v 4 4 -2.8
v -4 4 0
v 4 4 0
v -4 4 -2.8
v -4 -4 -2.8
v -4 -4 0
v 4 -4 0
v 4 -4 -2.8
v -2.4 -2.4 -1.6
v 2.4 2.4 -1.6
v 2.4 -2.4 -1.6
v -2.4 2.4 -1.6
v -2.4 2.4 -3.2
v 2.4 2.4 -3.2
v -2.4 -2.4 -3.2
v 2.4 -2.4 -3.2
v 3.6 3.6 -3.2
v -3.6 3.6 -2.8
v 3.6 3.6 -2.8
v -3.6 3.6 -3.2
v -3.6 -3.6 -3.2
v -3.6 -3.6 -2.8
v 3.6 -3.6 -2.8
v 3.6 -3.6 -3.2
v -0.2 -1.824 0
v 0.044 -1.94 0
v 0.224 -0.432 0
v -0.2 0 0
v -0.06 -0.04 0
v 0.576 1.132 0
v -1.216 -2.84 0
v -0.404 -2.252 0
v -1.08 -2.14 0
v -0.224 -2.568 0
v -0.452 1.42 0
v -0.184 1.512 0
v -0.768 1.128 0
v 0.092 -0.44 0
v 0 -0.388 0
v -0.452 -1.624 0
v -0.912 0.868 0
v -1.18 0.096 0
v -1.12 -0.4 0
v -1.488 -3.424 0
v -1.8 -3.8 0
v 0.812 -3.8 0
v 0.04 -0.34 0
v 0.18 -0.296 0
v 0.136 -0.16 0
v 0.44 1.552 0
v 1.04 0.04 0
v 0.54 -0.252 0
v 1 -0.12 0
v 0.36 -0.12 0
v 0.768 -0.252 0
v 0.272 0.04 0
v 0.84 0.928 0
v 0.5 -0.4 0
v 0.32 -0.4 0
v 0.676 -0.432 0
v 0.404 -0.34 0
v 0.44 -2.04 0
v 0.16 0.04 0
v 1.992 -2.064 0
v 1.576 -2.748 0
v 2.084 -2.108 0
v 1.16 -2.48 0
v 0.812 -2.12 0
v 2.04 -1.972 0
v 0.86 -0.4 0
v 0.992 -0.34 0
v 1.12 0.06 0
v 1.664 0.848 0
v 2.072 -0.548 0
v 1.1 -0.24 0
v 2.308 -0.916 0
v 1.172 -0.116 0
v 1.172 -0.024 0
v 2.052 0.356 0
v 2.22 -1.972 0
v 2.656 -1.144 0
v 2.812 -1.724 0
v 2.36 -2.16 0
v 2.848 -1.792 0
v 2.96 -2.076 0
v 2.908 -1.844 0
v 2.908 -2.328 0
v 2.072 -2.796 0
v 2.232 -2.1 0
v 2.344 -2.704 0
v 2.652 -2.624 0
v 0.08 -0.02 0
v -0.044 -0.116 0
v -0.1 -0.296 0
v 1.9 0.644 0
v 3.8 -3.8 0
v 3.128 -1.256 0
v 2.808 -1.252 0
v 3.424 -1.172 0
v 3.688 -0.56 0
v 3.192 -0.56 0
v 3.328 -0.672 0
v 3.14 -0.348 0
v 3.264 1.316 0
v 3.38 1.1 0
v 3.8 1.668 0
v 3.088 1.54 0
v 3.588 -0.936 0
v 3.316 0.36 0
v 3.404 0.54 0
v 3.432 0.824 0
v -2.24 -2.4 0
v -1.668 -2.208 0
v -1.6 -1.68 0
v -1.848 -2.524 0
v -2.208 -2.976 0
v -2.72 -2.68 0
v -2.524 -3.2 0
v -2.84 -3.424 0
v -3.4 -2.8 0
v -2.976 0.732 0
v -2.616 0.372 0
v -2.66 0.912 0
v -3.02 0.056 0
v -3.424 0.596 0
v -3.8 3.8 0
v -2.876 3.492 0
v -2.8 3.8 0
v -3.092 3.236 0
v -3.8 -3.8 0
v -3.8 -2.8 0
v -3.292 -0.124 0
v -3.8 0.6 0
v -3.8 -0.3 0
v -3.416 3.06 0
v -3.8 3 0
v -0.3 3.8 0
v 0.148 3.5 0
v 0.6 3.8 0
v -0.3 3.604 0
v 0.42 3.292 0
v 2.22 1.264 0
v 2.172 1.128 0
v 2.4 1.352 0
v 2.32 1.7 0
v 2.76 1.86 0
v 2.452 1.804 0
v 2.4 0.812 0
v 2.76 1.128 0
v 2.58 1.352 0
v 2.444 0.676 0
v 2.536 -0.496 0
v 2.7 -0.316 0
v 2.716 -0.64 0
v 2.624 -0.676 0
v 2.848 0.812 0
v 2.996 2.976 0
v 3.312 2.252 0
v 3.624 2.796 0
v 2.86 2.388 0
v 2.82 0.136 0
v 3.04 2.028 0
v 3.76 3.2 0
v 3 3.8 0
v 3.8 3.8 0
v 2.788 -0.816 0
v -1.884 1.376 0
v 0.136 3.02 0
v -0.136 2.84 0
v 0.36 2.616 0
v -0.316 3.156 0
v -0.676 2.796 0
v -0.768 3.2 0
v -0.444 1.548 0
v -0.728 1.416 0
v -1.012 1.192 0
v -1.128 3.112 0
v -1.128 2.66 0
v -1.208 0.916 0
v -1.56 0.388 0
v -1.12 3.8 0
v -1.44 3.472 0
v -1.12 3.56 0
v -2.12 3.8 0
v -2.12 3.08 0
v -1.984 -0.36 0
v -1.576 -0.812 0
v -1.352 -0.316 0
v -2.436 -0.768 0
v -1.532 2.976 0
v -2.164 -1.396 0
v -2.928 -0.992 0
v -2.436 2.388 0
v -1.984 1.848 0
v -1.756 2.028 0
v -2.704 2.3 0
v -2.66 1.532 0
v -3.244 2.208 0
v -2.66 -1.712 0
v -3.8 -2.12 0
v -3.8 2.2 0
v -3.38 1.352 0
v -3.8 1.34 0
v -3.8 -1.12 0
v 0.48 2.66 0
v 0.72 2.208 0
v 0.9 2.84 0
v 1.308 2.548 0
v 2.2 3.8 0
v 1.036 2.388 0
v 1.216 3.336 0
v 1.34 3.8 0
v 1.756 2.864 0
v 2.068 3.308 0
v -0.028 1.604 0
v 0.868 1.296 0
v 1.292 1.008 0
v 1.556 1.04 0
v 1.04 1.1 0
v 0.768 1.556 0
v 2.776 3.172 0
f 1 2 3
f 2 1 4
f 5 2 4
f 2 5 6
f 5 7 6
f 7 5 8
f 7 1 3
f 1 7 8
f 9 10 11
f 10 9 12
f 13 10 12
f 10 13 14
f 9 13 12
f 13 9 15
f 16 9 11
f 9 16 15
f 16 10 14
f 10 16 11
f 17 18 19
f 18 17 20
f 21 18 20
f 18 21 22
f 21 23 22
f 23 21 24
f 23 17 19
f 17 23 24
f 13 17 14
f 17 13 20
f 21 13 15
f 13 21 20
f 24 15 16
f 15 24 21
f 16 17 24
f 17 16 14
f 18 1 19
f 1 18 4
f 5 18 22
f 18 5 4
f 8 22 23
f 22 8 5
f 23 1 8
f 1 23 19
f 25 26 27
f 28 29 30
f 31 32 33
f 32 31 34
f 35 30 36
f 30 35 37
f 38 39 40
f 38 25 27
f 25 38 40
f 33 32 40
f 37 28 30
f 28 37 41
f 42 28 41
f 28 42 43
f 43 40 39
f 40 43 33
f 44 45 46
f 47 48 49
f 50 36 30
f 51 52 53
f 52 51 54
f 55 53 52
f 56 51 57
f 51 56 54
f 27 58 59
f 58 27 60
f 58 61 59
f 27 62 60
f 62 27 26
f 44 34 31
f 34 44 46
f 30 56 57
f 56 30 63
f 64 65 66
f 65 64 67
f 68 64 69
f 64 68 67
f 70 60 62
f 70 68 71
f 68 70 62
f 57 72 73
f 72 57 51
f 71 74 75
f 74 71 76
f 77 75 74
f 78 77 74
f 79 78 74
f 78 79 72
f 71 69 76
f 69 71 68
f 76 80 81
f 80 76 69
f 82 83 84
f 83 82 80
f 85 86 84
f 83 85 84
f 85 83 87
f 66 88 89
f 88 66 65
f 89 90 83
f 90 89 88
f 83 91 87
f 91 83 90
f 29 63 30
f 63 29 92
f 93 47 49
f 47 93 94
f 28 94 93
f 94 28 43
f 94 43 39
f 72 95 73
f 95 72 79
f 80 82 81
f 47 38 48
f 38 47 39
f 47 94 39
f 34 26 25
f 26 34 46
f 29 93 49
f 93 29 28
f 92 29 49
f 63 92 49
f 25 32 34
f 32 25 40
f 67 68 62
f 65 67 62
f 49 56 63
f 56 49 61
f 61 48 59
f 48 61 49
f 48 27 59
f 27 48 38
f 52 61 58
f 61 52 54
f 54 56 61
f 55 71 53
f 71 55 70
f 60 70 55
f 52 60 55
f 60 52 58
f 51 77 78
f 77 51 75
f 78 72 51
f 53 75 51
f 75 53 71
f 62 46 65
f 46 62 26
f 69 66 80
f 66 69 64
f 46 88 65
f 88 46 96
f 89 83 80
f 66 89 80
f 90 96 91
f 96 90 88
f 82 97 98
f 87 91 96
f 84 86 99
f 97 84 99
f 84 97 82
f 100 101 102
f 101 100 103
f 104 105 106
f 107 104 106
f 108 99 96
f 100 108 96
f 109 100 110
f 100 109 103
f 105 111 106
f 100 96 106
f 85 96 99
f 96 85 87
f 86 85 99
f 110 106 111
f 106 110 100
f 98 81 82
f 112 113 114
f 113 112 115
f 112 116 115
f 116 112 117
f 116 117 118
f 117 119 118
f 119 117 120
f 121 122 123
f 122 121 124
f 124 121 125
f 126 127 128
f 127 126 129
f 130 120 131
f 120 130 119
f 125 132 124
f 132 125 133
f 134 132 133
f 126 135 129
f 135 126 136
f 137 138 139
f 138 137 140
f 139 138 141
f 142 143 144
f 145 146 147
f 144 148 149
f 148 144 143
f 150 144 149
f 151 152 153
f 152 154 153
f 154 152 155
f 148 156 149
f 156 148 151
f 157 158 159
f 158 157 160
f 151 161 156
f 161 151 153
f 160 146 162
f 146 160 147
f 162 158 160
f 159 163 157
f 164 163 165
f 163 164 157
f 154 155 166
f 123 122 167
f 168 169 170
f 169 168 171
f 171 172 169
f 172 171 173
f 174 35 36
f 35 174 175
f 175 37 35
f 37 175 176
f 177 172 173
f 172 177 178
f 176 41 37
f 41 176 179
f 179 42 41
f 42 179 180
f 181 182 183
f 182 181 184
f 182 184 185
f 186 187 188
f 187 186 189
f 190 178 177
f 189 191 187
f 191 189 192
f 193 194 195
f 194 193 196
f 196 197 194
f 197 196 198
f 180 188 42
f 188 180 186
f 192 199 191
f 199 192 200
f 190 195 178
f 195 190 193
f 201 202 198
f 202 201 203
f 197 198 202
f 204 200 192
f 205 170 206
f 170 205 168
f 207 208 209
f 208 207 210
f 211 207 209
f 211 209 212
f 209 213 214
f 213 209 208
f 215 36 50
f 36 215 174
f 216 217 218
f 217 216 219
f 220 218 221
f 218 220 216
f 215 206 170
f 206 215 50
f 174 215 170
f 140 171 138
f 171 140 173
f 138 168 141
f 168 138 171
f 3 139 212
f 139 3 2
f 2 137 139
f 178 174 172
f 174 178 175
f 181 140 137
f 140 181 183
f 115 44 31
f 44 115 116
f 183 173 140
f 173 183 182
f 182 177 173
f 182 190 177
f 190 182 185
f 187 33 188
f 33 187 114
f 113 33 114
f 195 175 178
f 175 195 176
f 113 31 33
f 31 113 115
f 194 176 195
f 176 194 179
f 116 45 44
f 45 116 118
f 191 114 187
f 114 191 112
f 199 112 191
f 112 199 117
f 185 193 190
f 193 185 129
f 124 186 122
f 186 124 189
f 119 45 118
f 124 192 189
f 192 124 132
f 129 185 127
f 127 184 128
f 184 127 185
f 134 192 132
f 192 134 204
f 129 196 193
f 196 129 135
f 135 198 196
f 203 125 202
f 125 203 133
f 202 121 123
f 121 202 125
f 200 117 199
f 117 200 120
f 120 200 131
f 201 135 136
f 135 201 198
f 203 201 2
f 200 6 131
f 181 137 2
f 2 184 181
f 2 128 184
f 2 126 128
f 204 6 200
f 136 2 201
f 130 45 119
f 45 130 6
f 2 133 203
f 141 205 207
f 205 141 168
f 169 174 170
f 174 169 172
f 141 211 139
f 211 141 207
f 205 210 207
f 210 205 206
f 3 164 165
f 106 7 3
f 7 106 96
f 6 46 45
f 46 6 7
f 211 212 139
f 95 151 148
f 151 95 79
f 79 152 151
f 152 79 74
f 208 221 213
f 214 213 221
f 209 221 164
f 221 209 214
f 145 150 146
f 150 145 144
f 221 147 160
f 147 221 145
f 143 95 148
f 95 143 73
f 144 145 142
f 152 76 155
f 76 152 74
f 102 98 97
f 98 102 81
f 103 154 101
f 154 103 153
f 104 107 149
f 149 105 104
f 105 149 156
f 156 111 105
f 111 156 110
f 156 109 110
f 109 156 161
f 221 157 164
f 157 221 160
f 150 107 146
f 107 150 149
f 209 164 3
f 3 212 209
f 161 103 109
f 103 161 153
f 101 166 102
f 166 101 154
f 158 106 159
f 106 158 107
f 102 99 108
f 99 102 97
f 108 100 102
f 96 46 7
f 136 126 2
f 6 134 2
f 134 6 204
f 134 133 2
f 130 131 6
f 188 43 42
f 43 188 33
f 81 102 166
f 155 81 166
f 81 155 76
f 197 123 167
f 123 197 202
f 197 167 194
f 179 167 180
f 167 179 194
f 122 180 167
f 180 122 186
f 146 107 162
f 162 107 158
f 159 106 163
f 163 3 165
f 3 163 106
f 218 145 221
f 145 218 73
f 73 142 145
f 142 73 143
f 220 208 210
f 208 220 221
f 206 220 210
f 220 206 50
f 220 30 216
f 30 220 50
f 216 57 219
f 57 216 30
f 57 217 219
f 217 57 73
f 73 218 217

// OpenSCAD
// file: ../p/box5.scad
use <../lib.scad>
function ldraw_lib__box5() = [
// 0 Box with 5 Faces and All Edges
// 0 Name: box5.dat
// 0 Author: James Jessiman
// 0 !LDRAW_ORG Primitive UPDATE 2012-01
// 0 !LICENSE Licensed under CC BY 2.0 and CC BY 4.0 : see CAreadme.txt
// 
// 0 BFC CERTIFY CCW
  [0,"BFC","CERTIFY"],
  [0,"BFC","CCW"],
// 
// 0 !HISTORY 2002-04-03 [sbliss] Modified for BFC compliance
// 0 !HISTORY 2002-04-25 [PTadmin] Official Update 2002-02
// 0 !HISTORY 2007-06-24 [PTadmin] Header formatted for Contributor Agreement
// 0 !HISTORY 2008-07-01 [PTadmin] Official Update 2008-01
// 0 !HISTORY 2012-02-16 [Philo] Changed to CCW
// 0 !HISTORY 2012-03-30 [PTadmin] Official Update 2012-01
// 
// 
// 2 24 1 1 1 -1 1 1
  [2,24,1,1,1,-1,1,1],
// 2 24 -1 1 1 -1 1 -1
  [2,24,-1,1,1,-1,1,-1],
// 2 24 -1 1 -1 1 1 -1
  [2,24,-1,1,-1,1,1,-1],
// 2 24 1 1 -1 1 1 1
  [2,24,1,1,-1,1,1,1],
// 2 24 1 0 1 -1 0 1
  [2,24,1,0,1,-1,0,1],
// 2 24 -1 0 1 -1 0 -1
  [2,24,-1,0,1,-1,0,-1],
// 2 24 -1 0 -1 1 0 -1
  [2,24,-1,0,-1,1,0,-1],
// 2 24 1 0 -1 1 0 1
  [2,24,1,0,-1,1,0,1],
// 2 24 1 0 1 1 1 1
  [2,24,1,0,1,1,1,1],
// 2 24 -1 0 1 -1 1 1
  [2,24,-1,0,1,-1,1,1],
// 2 24 1 0 -1 1 1 -1
  [2,24,1,0,-1,1,1,-1],
// 2 24 -1 0 -1 -1 1 -1
  [2,24,-1,0,-1,-1,1,-1],
// 4 16 -1 1 1 1 1 1 1 1 -1 -1 1 -1
  [4,16,-1,1,1,1,1,1,1,1,-1,-1,1,-1],
// 4 16 -1 1 1 -1 0 1 1 0 1 1 1 1
  [4,16,-1,1,1,-1,0,1,1,0,1,1,1,1],
// 4 16 -1 1 -1 -1 0 -1 -1 0 1 -1 1 1
  [4,16,-1,1,-1,-1,0,-1,-1,0,1,-1,1,1],
// 4 16 1 1 -1 1 0 -1 -1 0 -1 -1 1 -1
  [4,16,1,1,-1,1,0,-1,-1,0,-1,-1,1,-1],
// 4 16 1 1 1 1 0 1 1 0 -1 1 1 -1
  [4,16,1,1,1,1,0,1,1,0,-1,1,1,-1],
];
module ldraw_lib__box5(step=0, col=false, unit=2/5, alt=false, line=0.2, solid=!$preview)
    makepoly(ldraw_lib__box5(), step=step, col=col, unit=unit, alt=alt, line=line, solid=solid);
ldraw_lib__box5(line=0.2);
// file: ../p/box4.scad
use <../lib.scad>
function ldraw_lib__box4() = [
// 0 Box with 4 Faces (2 Parallel Pairs) and All Edges
// 0 Name: box4.dat
// 0 Author: James Jessiman
// 0 !LDRAW_ORG Primitive UPDATE 2012-01
// 0 !LICENSE Licensed under CC BY 2.0 and CC BY 4.0 : see CAreadme.txt
// 
// 0 BFC CERTIFY CCW
  [0,"BFC","CERTIFY"],
  [0,"BFC","CCW"],
// 
// 0 !HISTORY 2002-04-03 [sbliss] Modified for BFC compliance
// 0 !HISTORY 2002-04-25 [PTadmin] Official Update 2002-02
// 0 !HISTORY 2007-06-24 [PTadmin] Header formatted for Contributor Agreement
// 0 !HISTORY 2008-07-01 [PTadmin] Official Update 2008-01
// 0 !HISTORY 2012-02-16 [Philo] Changed to CCW
// 0 !HISTORY 2012-03-30 [PTadmin] Official Update 2012-01
// 
// 
// 2 24 1 1 1 -1 1 1
  [2,24,1,1,1,-1,1,1],
// 2 24 -1 1 1 -1 1 -1
  [2,24,-1,1,1,-1,1,-1],
// 2 24 -1 1 -1 1 1 -1
  [2,24,-1,1,-1,1,1,-1],
// 2 24 1 1 -1 1 1 1
  [2,24,1,1,-1,1,1,1],
// 2 24 1 0 1 -1 0 1
  [2,24,1,0,1,-1,0,1],
// 2 24 -1 0 1 -1 0 -1
  [2,24,-1,0,1,-1,0,-1],
// 2 24 -1 0 -1 1 0 -1
  [2,24,-1,0,-1,1,0,-1],
// 2 24 1 0 -1 1 0 1
  [2,24,1,0,-1,1,0,1],
// 2 24 1 0 1 1 1 1
  [2,24,1,0,1,1,1,1],
// 2 24 -1 0 1 -1 1 1
  [2,24,-1,0,1,-1,1,1],
// 2 24 1 0 -1 1 1 -1
  [2,24,1,0,-1,1,1,-1],
// 2 24 -1 0 -1 -1 1 -1
  [2,24,-1,0,-1,-1,1,-1],
// 4 16 -1 1 1 -1 0 1 1 0 1 1 1 1
  [4,16,-1,1,1,-1,0,1,1,0,1,1,1,1],
// 4 16 -1 1 -1 -1 0 -1 -1 0 1 -1 1 1
  [4,16,-1,1,-1,-1,0,-1,-1,0,1,-1,1,1],
// 4 16 1 1 -1 1 0 -1 -1 0 -1 -1 1 -1
  [4,16,1,1,-1,1,0,-1,-1,0,-1,-1,1,-1],
// 4 16 1 1 1 1 0 1 1 0 -1 1 1 -1
  [4,16,1,1,1,1,0,1,1,0,-1,1,1,-1],
];
module ldraw_lib__box4(step=0, col=false, unit=2/5, alt=false, line=0.2, solid=!$preview)
    makepoly(ldraw_lib__box4(), step=step, col=col, unit=unit, alt=alt, line=line, solid=solid);
ldraw_lib__box4(line=0.2);
// file: s/3070bs01.scad
use <../../lib.scad>
use <../../p/box4.scad>
use <../../p/box5.scad>
function ldraw_lib__s__3070bs01() = [
// 0 ~Tile  1 x  1 with Groove without Top Face
// 0 Name: s\3070bs01.dat
// 0 Author: Chris Dee [cwdee]
// 0 !LDRAW_ORG Subpart UPDATE 2009-02
// 0 !LICENSE Licensed under CC BY 2.0 and CC BY 4.0 : see CAreadme.txt
// 
// 0 BFC CERTIFY CCW
  [0,"BFC","CERTIFY"],
  [0,"BFC","CCW"],
// 
// 0 !HISTORY 2009-09-03 [PTadmin] Official Update 2009-02
// 
// 
// 1 16 0 0 0 10 0 0 0 7 0 0 0 10 box4.dat
  [1,16,0,0,0,10,0,0,0,7,0,0,0,10, ldraw_lib__box4()],
// 0 BFC INVERTNEXT
  [0,"BFC","INVERTNEXT"],
// 1 16 0 8 0 6 0 0 0 -4 0 0 0 6 box5.dat
  [1,16,0,8,0,6,0,0,0,-4,0,0,0,6, ldraw_lib__box5()],
// 1 16 0 7 0 9 0 0 0 1 0 0 0 9 box4.dat
  [1,16,0,7,0,9,0,0,0,1,0,0,0,9, ldraw_lib__box4()],
// 
// 4 16 9 8 9 6 8 6 -6 8 6 -9 8 9
  [4,16,9,8,9,6,8,6,-6,8,6,-9,8,9],
// 4 16 -9 8 9 -6 8 6 -6 8 -6 -9 8 -9
  [4,16,-9,8,9,-6,8,6,-6,8,-6,-9,8,-9],
// 4 16 -9 8 -9 -6 8 -6 6 8 -6 9 8 -9
  [4,16,-9,8,-9,-6,8,-6,6,8,-6,9,8,-9],
// 4 16 9 8 -9 6 8 -6 6 8 6 9 8 9
  [4,16,9,8,-9,6,8,-6,6,8,6,9,8,9],
// 
// 4 16 10 7 10 9 7 9 -9 7 9 -10 7 10
  [4,16,10,7,10,9,7,9,-9,7,9,-10,7,10],
// 4 16 -10 7 10 -9 7 9 -9 7 -9 -10 7 -10
  [4,16,-10,7,10,-9,7,9,-9,7,-9,-10,7,-10],
// 4 16 -10 7 -10 -9 7 -9 9 7 -9 10 7 -10
  [4,16,-10,7,-10,-9,7,-9,9,7,-9,10,7,-10],
// 4 16 10 7 -10 9 7 -9 9 7 9 10 7 10
  [4,16,10,7,-10,9,7,-9,9,7,9,10,7,10],
// 0
];
module ldraw_lib__s__3070bs01(step=0, col=false, unit=2/5, alt=false, line=0.2, solid=!$preview)
    makepoly(ldraw_lib__s__3070bs01(), step=step, col=col, unit=unit, alt=alt, line=line, solid=solid);
ldraw_lib__s__3070bs01(line=0.2);
// main file
use <../lib.scad>
use <s/3070bs01.scad>
function ldraw_lib__3070bp0o() = [
// 0 Tile  1 x  1 with Coral and Metallic Light Blue Swirl and Unicorn Head Pattern
// 0 Name: 3070bp0o.dat
// 0 Author: Vincent Messenet [Cheenzo]
// 0 !LDRAW_ORG Part UPDATE 2022-03
// 0 !LICENSE Licensed under CC BY 2.0 and CC BY 4.0 : see CAreadme.txt
// 
// 0 BFC CERTIFY CCW
  [0,"BFC","CERTIFY"],
  [0,"BFC","CCW"],
// 
// 0 !KEYWORDS BrickLink 3070bpb135, set 21045, Set 41902, Set 80105
// 
// 0 !HISTORY 2020-12-29 [PTadmin] Official Update 2020-03
// 0 !HISTORY 2022-02-19 [MagFors] Corrected blue colour
// 0 !HISTORY 2022-05-07 [PTadmin] Official Update 2022-03
// 
// 
// 1 16 0 0 0 1 0 0 0 1 0 0 0 1 s\3070bs01.dat
  [1,16,0,0,0,1,0,0,0,1,0,0,0,1, ldraw_lib__s__3070bs01()],
// 3 15 -.5 0 -4.56 .11 0 -4.85 .56 0 -1.08
  [3,15,-.5,0,-4.56,.11,0,-4.85,.56,0,-1.08],
// 3 15 -.5 0 0 -.15 0 -.1 1.44 0 2.83
  [3,15,-.5,0,0,-.15,0,-.1,1.44,0,2.83],
// 4 15 -3.04 0 -7.1 -.56 0 -6.42 -1.01 0 -5.63 -2.7 0 -5.35
  [4,15,-3.04,0,-7.1,-.56,0,-6.42,-1.01,0,-5.63,-2.7,0,-5.35],
// 4 15 -.46 0 3.78 -1.13 0 3.55 -1.92 0 2.82 1.44 0 2.83
  [4,15,-.46,0,3.78,-1.13,0,3.55,-1.92,0,2.82,1.44,0,2.83],
// 3 15 .23 0 -1.1 0 0 -.97 -1.13 0 -4.06
  [3,15,.23,0,-1.1,0,0,-.97,-1.13,0,-4.06],
// 4 15 -1.13 0 -4.06 -.5 0 -4.56 .56 0 -1.08 .23 0 -1.1
  [4,15,-1.13,0,-4.06,-.5,0,-4.56,.56,0,-1.08,.23,0,-1.1],
// 3 15 -2.7 0 -5.35 -1.01 0 -5.63 -1.13 0 -4.06
  [3,15,-2.7,0,-5.35,-1.01,0,-5.63,-1.13,0,-4.06],
// 4 15 -2.28 0 2.17 -.5 0 0 1.44 0 2.83 -1.92 0 2.82
  [4,15,-2.28,0,2.17,-.5,0,0,1.44,0,2.83,-1.92,0,2.82],
// 4 15 -2.8 0 -1 -.5 0 0 -2.28 0 2.17 -2.95 0 .24
  [4,15,-2.8,0,-1,-.5,0,0,-2.28,0,2.17,-2.95,0,.24],
// 4 15 -2.7 0 -5.35 -1.13 0 -4.06 0 0 -.97 -2.8 0 -1
  [4,15,-2.7,0,-5.35,-1.13,0,-4.06,0,0,-.97,-2.8,0,-1],
// 3 15 -3.72 0 -8.56 -4.5 0 -9.5 2.03 0 -9.5
  [3,15,-3.72,0,-8.56,-4.5,0,-9.5,2.03,0,-9.5],
// 3 15 .1 0 -.85 .45 0 -.74 .34 0 -.4
  [3,15,.1,0,-.85,.45,0,-.74,.34,0,-.4],
// 3 15 1.1 0 3.88 -.46 0 3.78 1.44 0 2.83
  [3,15,1.1,0,3.88,-.46,0,3.78,1.44,0,2.83],
// 4 15 2.6 0 .1 .9 0 -.3 1.35 0 -.63 2.5 0 -.3
  [4,15,2.6,0,.1,.9,0,-.3,1.35,0,-.63,2.5,0,-.3],
// 3 15 1.92 0 -.63 2.5 0 -.3 1.35 0 -.63
  [3,15,1.92,0,-.63,2.5,0,-.3,1.35,0,-.63],
// 4 15 2.1 0 2.32 .68 0 .1 .9 0 -.3 2.6 0 .1
  [4,15,2.1,0,2.32,.68,0,.1,.9,0,-.3,2.6,0,.1],
// 4 15 1.25 0 -1 .8 0 -1 .56 0 -1.08 1.69 0 -1.08
  [4,15,1.25,0,-1,.8,0,-1,.56,0,-1.08,1.69,0,-1.08],
// 3 15 1.25 0 -1 1.01 0 -.85 .8 0 -1
  [3,15,1.25,0,-1,1.01,0,-.85,.8,0,-1],
// 4 15 1.1 0 -5.1 1.69 0 -1.08 .56 0 -1.08 .11 0 -4.85
  [4,15,1.1,0,-5.1,1.69,0,-1.08,.56,0,-1.08,.11,0,-4.85],
// 4 15 -3.04 0 -7.1 -3.72 0 -8.56 2.03 0 -9.5 -.56 0 -6.42
  [4,15,-3.04,0,-7.1,-3.72,0,-8.56,2.03,0,-9.5,-.56,0,-6.42],
// 4 15 .4 0 .1 .68 0 .1 2.1 0 2.32 1.44 0 2.83
  [4,15,.4,0,.1,.68,0,.1,2.1,0,2.32,1.44,0,2.83],
// 4 15 5.21 0 -5.27 4.98 0 -5.16 2.9 0 -6.2 3.94 0 -6.87
  [4,15,5.21,0,-5.27,4.98,0,-5.16,2.9,0,-6.2,3.94,0,-6.87],
// 4 15 5.1 0 -4.93 2.03 0 -5.3 2.9 0 -6.2 4.98 0 -5.16
  [4,15,5.1,0,-4.93,2.03,0,-5.3,2.9,0,-6.2,4.98,0,-5.16],
// 3 15 2.15 0 -1 1.69 0 -1.08 1.1 0 -5.1
  [3,15,2.15,0,-1,1.69,0,-1.08,1.1,0,-5.1],
// 4 15 1.1 0 -5.1 2.03 0 -5.3 2.48 0 -.85 2.15 0 -1
  [4,15,1.1,0,-5.1,2.03,0,-5.3,2.48,0,-.85,2.15,0,-1],
// 4 15 4.16 0 2.12 2.1 0 2.32 2.6 0 .1 2.8 0 .15
  [4,15,4.16,0,2.12,2.1,0,2.32,2.6,0,.1,2.8,0,.15],
// 4 15 5.77 0 -2.29 5.18 0 -1.37 2.75 0 -.6 2.48 0 -.85
  [4,15,5.77,0,-2.29,5.18,0,-1.37,2.75,0,-.6,2.48,0,-.85],
// 3 15 2.93 0 -.29 2.75 0 -.6 5.18 0 -1.37
  [3,15,2.93,0,-.29,2.75,0,-.6,5.18,0,-1.37],
// 3 15 2.93 0 -.06 2.93 0 -.29 5.18 0 -1.37
  [3,15,2.93,0,-.06,2.93,0,-.29,5.18,0,-1.37],
// 4 15 5.13 0 .89 2.8 0 .15 2.93 0 -.06 5.18 0 -1.37
  [4,15,5.13,0,.89,2.8,0,.15,2.93,0,-.06,5.18,0,-1.37],
// 4 15 2.48 0 -.85 2.03 0 -5.3 5.1 0 -4.93 5.77 0 -2.29
  [4,15,2.48,0,-.85,2.03,0,-5.3,5.1,0,-4.93,5.77,0,-2.29],
// 4 15 5.55 0 -4.93 6.64 0 -2.86 5.77 0 -2.29 5.1 0 -4.93
  [4,15,5.55,0,-4.93,6.64,0,-2.86,5.77,0,-2.29,5.1,0,-4.93],
// 4 15 7.03 0 -4.31 5.55 0 -4.93 5.9 0 -5.4 7.12 0 -4.48
  [4,15,7.03,0,-4.31,5.55,0,-4.93,5.9,0,-5.4,7.12,0,-4.48],
// 3 15 7.4 0 -5.19 7.27 0 -4.61 7.12 0 -4.48
  [3,15,7.4,0,-5.19,7.27,0,-4.61,7.12,0,-4.48],
// 4 15 7.12 0 -4.48 5.9 0 -5.4 7.27 0 -5.82 7.4 0 -5.19
  [4,15,7.12,0,-4.48,5.9,0,-5.4,7.27,0,-5.82,7.4,0,-5.19],
// 4 15 5.21 0 -5.27 3.94 0 -6.87 5.18 0 -6.99 5.58 0 -5.25
  [4,15,5.21,0,-5.27,3.94,0,-6.87,5.18,0,-6.99,5.58,0,-5.25],
// 4 15 5.58 0 -5.25 5.18 0 -6.99 5.86 0 -6.76 5.9 0 -5.4
  [4,15,5.58,0,-5.25,5.18,0,-6.99,5.86,0,-6.76,5.9,0,-5.4],
// 4 15 7.27 0 -5.82 5.9 0 -5.4 5.86 0 -6.76 6.63 0 -6.56
  [4,15,7.27,0,-5.82,5.9,0,-5.4,5.86,0,-6.76,6.63,0,-6.56],
// 4 15 1.44 0 2.83 -.15 0 -.1 .2 0 -.05 .4 0 .1
  [4,15,1.44,0,2.83,-.15,0,-.1,.2,0,-.05,.4,0,.1],
// 4 15 -.25 0 -.74 .1 0 -.85 .34 0 -.4 -.11 0 -.29
  [4,15,-.25,0,-.74,.1,0,-.85,.34,0,-.4,-.11,0,-.29],
// 4 15 -.25 0 -.74 -.11 0 -.29 -.5 0 0 -2.8 0 -1
  [4,15,-.25,0,-.74,-.11,0,-.29,-.5,0,0,-2.8,0,-1],
// 3 15 -.25 0 -.74 -2.8 0 -1 0 0 -.97
  [3,15,-.25,0,-.74,-2.8,0,-1,0,0,-.97],
// 4 15 4.16 0 2.12 2.8 0 .15 5.13 0 .89 4.75 0 1.61
  [4,15,4.16,0,2.12,2.8,0,.15,5.13,0,.89,4.75,0,1.61],
// 3 15 5.55 0 -4.93 7.03 0 -4.31 6.64 0 -2.86
  [3,15,5.55,0,-4.93,7.03,0,-4.31,6.64,0,-2.86],
// 4 0 .45 0 -.74 .1 0 -.85 0 0 -.97 .23 0 -1.1
  [4,0,.45,0,-.74,.1,0,-.85,0,0,-.97,.23,0,-1.1],
// 3 0 .1 0 -.85 -.25 0 -.74 0 0 -.97
  [3,0,.1,0,-.85,-.25,0,-.74,0,0,-.97],
// 4 0 -.56 0 -6.42 2.03 0 -9.5 .11 0 -4.85 -.5 0 -4.56
  [4,0,-.56,0,-6.42,2.03,0,-9.5,.11,0,-4.85,-.5,0,-4.56],
// 4 0 -.11 0 -.29 .34 0 -.4 -.15 0 -.1 -.5 0 0
  [4,0,-.11,0,-.29,.34,0,-.4,-.15,0,-.1,-.5,0,0],
// 3 0 .2 0 -.05 -.15 0 -.1 .34 0 -.4
  [3,0,.2,0,-.05,-.15,0,-.1,.34,0,-.4],
// 3 0 .4 0 .1 .2 0 -.05 .34 0 -.4
  [3,0,.4,0,.1,.2,0,-.05,.34,0,-.4],
// 4 0 -.56 0 -6.42 -.5 0 -4.56 -1.13 0 -4.06 -1.01 0 -5.63
  [4,0,-.56,0,-6.42,-.5,0,-4.56,-1.13,0,-4.06,-1.01,0,-5.63],
// 3 0 2.9 0 -6.2 2.03 0 -5.3 1.1 0 -5.1
  [3,0,2.9,0,-6.2,2.03,0,-5.3,1.1,0,-5.1],
// 3 0 3.94 0 -6.87 2.9 0 -6.2 1.1 0 -5.1
  [3,0,3.94,0,-6.87,2.9,0,-6.2,1.1,0,-5.1],
// 4 0 .4 0 .1 .34 0 -.4 1.01 0 -.85 .68 0 .1
  [4,0,.4,0,.1,.34,0,-.4,1.01,0,-.85,.68,0,.1],
// 4 0 .8 0 -1 1.01 0 -.85 .34 0 -.4 .45 0 -.74
  [4,0,.8,0,-1,1.01,0,-.85,.34,0,-.4,.45,0,-.74],
// 4 0 .56 0 -1.08 .8 0 -1 .45 0 -.74 .23 0 -1.1
  [4,0,.56,0,-1.08,.8,0,-1,.45,0,-.74,.23,0,-1.1],
// 4 0 1.35 0 -.63 .9 0 -.3 1.01 0 -.85 1.25 0 -1
  [4,0,1.35,0,-.63,.9,0,-.3,1.01,0,-.85,1.25,0,-1],
// 3 0 .9 0 -.3 .68 0 .1 1.01 0 -.85
  [3,0,.9,0,-.3,.68,0,.1,1.01,0,-.85],
// 4 0 1.92 0 -.63 2.15 0 -1 2.48 0 -.85 2.5 0 -.3
  [4,0,1.92,0,-.63,2.15,0,-1,2.48,0,-.85,2.5,0,-.3],
// 3 0 1.69 0 -1.08 2.15 0 -1 1.92 0 -.63
  [3,0,1.69,0,-1.08,2.15,0,-1,1.92,0,-.63],
// 4 0 1.25 0 -1 1.69 0 -1.08 1.92 0 -.63 1.35 0 -.63
  [4,0,1.25,0,-1,1.69,0,-1.08,1.92,0,-.63,1.35,0,-.63],
// 4 0 2.93 0 -.29 2.93 0 -.06 2.6 0 .1 2.75 0 -.6
  [4,0,2.93,0,-.29,2.93,0,-.06,2.6,0,.1,2.75,0,-.6],
// 3 0 2.93 0 -.06 2.8 0 .15 2.6 0 .1
  [3,0,2.93,0,-.06,2.8,0,.15,2.6,0,.1],
// 4 0 2.5 0 -.3 2.48 0 -.85 2.75 0 -.6 2.6 0 .1
  [4,0,2.5,0,-.3,2.48,0,-.85,2.75,0,-.6,2.6,0,.1],
// 4 0 1.1 0 -5.1 .11 0 -4.85 2.03 0 -9.5 3.94 0 -6.87
  [4,0,1.1,0,-5.1,.11,0,-4.85,2.03,0,-9.5,3.94,0,-6.87],
// 4 0 5.55 0 -4.93 5.1 0 -4.93 4.98 0 -5.16 5.21 0 -5.27
  [4,0,5.55,0,-4.93,5.1,0,-4.93,4.98,0,-5.16,5.21,0,-5.27],
// 4 0 9.5 0 -9.5 5.18 0 -6.99 3.94 0 -6.87 2.03 0 -9.5
  [4,0,9.5,0,-9.5,5.18,0,-6.99,3.94,0,-6.87,2.03,0,-9.5],
// 3 0 5.58 0 -5.25 5.9 0 -5.4 5.55 0 -4.93
  [3,0,5.58,0,-5.25,5.9,0,-5.4,5.55,0,-4.93],
// 3 0 5.21 0 -5.27 5.58 0 -5.25 5.55 0 -4.93
  [3,0,5.21,0,-5.27,5.58,0,-5.25,5.55,0,-4.93],
// 4 0 5.18 0 -6.99 9.5 0 -9.5 6.63 0 -6.56 5.86 0 -6.76
  [4,0,5.18,0,-6.99,9.5,0,-9.5,6.63,0,-6.56,5.86,0,-6.76],
// 3 0 7.03 0 -4.31 7.82 0 -3.14 7.02 0 -3.13
  [3,0,7.03,0,-4.31,7.82,0,-3.14,7.02,0,-3.13],
// 3 0 7.27 0 -5.82 6.63 0 -6.56 9.5 0 -9.5
  [3,0,7.27,0,-5.82,6.63,0,-6.56,9.5,0,-9.5],
// 3 0 7.12 0 -4.48 7.27 0 -4.61 8.56 0 -2.93
  [3,0,7.12,0,-4.48,7.27,0,-4.61,8.56,0,-2.93],
// 4 0 8.56 0 -2.93 7.82 0 -3.14 7.03 0 -4.31 7.12 0 -4.48
  [4,0,8.56,0,-2.93,7.82,0,-3.14,7.03,0,-4.31,7.12,0,-4.48],
// 4 0 9.22 0 -1.4 7.85 0 -.87 7.98 0 -1.4 8.32 0 -1.68
  [4,0,9.22,0,-1.4,7.85,0,-.87,7.98,0,-1.4,8.32,0,-1.68],
// 3 0 8.16 0 3.29 8.45 0 2.75 9.5 0 4.17
  [3,0,8.16,0,3.29,8.45,0,2.75,9.5,0,4.17],
// 3 0 7.72 0 3.85 8.16 0 3.29 9.5 0 4.17
  [3,0,7.72,0,3.85,8.16,0,3.29,9.5,0,4.17],
// 3 0 8.97 0 -2.34 8.56 0 -2.93 9.5 0 -9.5
  [3,0,8.97,0,-2.34,8.56,0,-2.93,9.5,0,-9.5],
// 3 0 9.22 0 -1.4 8.97 0 -2.34 9.5 0 -9.5
  [3,0,9.22,0,-1.4,8.97,0,-2.34,9.5,0,-9.5],
// 4 0 8.51 0 1.35 8.29 0 .9 7.85 0 -.87 9.22 0 -1.4
  [4,0,8.51,0,1.35,8.29,0,.9,7.85,0,-.87,9.22,0,-1.4],
// 3 0 8.45 0 2.75 8.58 0 2.06 9.5 0 4.17
  [3,0,8.45,0,2.75,8.58,0,2.06,9.5,0,4.17],
// 3 0 9.22 0 -1.4 9.5 0 -9.5 9.5 0 4.17
  [3,0,9.22,0,-1.4,9.5,0,-9.5,9.5,0,4.17],
// 4 0 7.27 0 -5.82 9.5 0 -9.5 8.56 0 -2.93 7.4 0 -5.19
  [4,0,7.27,0,-5.82,9.5,0,-9.5,8.56,0,-2.93,7.4,0,-5.19],
// 3 0 7.27 0 -4.61 7.4 0 -5.19 8.56 0 -2.93
  [3,0,7.27,0,-4.61,7.4,0,-5.19,8.56,0,-2.93],
// 4 0 8.58 0 2.06 8.51 0 1.35 9.22 0 -1.4 9.5 0 4.17
  [4,0,8.58,0,2.06,8.51,0,1.35,9.22,0,-1.4,9.5,0,4.17],
// 3 0 7.02 0 -3.13 6.64 0 -2.86 7.03 0 -4.31
  [3,0,7.02,0,-3.13,6.64,0,-2.86,7.03,0,-4.31],
// 4 353 -4 0 -4.2 -5.6 0 -6 -4.62 0 -6.31 -4.17 0 -5.52
  [4,353,-4,0,-4.2,-5.6,0,-6,-4.62,0,-6.31,-4.17,0,-5.52],
// 4 353 -6.8 0 -6.7 -5.52 0 -7.44 -4.62 0 -6.31 -5.6 0 -6
  [4,353,-6.8,0,-6.7,-5.52,0,-7.44,-4.62,0,-6.31,-5.6,0,-6],
// 3 353 -5.52 0 -7.44 -6.8 0 -6.7 -6.31 0 -8
  [3,353,-5.52,0,-7.44,-6.8,0,-6.7,-6.31,0,-8],
// 4 353 -8.5 0 -7 -7.1 0 -8.56 -6.31 0 -8 -6.8 0 -6.7
  [4,353,-8.5,0,-7,-7.1,0,-8.56,-6.31,0,-8,-6.8,0,-6.7],
// 4 353 -6.65 0 2.28 -7.44 0 1.83 -7.55 0 .14 -6.54 0 .93
  [4,353,-6.65,0,2.28,-7.44,0,1.83,-7.55,0,.14,-6.54,0,.93],
// 3 353 -7.55 0 .14 -7.44 0 1.83 -8.56 0 1.49
  [3,353,-7.55,0,.14,-7.44,0,1.83,-8.56,0,1.49],
// 4 353 -7 0 9.5 -9.5 0 9.5 -7.73 0 8.09 -7.19 0 8.73
  [4,353,-7,0,9.5,-9.5,0,9.5,-7.73,0,8.09,-7.19,0,8.73],
// 4 353 -7.1 0 -8.56 -8.5 0 -7 -9.5 0 -7 -9.5 0 -9.5
  [4,353,-7.1,0,-8.56,-8.5,0,-7,-9.5,0,-7,-9.5,0,-9.5],
// 4 353 -7.55 0 .14 -8.56 0 1.49 -9.5 0 1.5 -8.23 0 -.31
  [4,353,-7.55,0,.14,-8.56,0,1.49,-9.5,0,1.5,-8.23,0,-.31],
// 3 353 -9.5 0 -.75 -8.23 0 -.31 -9.5 0 1.5
  [3,353,-9.5,0,-.75,-8.23,0,-.31,-9.5,0,1.5],
// 4 353 -7.73 0 8.09 -9.5 0 9.5 -9.5 0 7.5 -8.54 0 7.65
  [4,353,-7.73,0,8.09,-9.5,0,9.5,-9.5,0,7.5,-8.54,0,7.65],
// 4 353 -.75 0 9.01 .37 0 8.75 1.5 0 9.5 -.75 0 9.5
  [4,353,-.75,0,9.01,.37,0,8.75,1.5,0,9.5,-.75,0,9.5],
// 3 353 1.5 0 9.5 .37 0 8.75 1.05 0 8.23
  [3,353,1.5,0,9.5,.37,0,8.75,1.05,0,8.23],
// 3 353 5.55 0 3.16 5.43 0 2.82 6 0 3.38
  [3,353,5.55,0,3.16,5.43,0,2.82,6,0,3.38],
// 3 353 5.8 0 4.25 6.9 0 4.65 6.13 0 4.51
  [3,353,5.8,0,4.25,6.9,0,4.65,6.13,0,4.51],
// 4 353 5.43 0 2.82 6 0 2.03 6.9 0 2.82 6 0 3.38
  [4,353,5.43,0,2.82,6,0,2.03,6.9,0,2.82,6,0,3.38],
// 3 353 6.45 0 3.38 6 0 3.38 6.9 0 2.82
  [3,353,6.45,0,3.38,6,0,3.38,6.9,0,2.82],
// 3 353 6.11 0 1.69 6.34 0 -1.24 6.75 0 -.79
  [3,353,6.11,0,1.69,6.34,0,-1.24,6.75,0,-.79],
// 4 353 6.56 0 -1.69 6.79 0 -1.6 6.75 0 -.79 6.34 0 -1.24
  [4,353,6.56,0,-1.69,6.79,0,-1.6,6.75,0,-.79,6.34,0,-1.24],
// 4 353 6.11 0 1.69 7.12 0 2.03 6.9 0 2.82 6 0 2.03
  [4,353,6.11,0,1.69,7.12,0,2.03,6.9,0,2.82,6,0,2.03],
// 4 353 9.06 0 6.99 7.49 0 7.44 7.15 0 5.97 8.28 0 5.63
  [4,353,9.06,0,6.99,7.49,0,7.44,7.15,0,5.97,8.28,0,5.63],
// 4 353 7.05 0 .34 7.12 0 2.03 6.11 0 1.69 6.75 0 -.79
  [4,353,7.05,0,.34,7.12,0,2.03,6.11,0,1.69,6.75,0,-.79],
// 4 353 6.13 0 4.51 6.9 0 4.65 7.6 0 5.07 7.15 0 5.97
  [4,353,6.13,0,4.51,6.9,0,4.65,7.6,0,5.07,7.15,0,5.97],
// 3 353 7.6 0 5.07 8.28 0 5.63 7.15 0 5.97
  [3,353,7.6,0,5.07,8.28,0,5.63,7.15,0,5.97],
// 3 353 9.06 0 6.99 9.4 0 8 7.49 0 7.44
  [3,353,9.06,0,6.99,9.4,0,8,7.49,0,7.44],
// 4 353 7.49 0 7.44 9.4 0 8 9.5 0 9.5 7.5 0 9.5
  [4,353,7.49,0,7.44,9.4,0,8,9.5,0,9.5,7.5,0,9.5],
// 3 353 6.79 0 -1.6 6.56 0 -1.69 6.97 0 -2.04
  [3,353,6.79,0,-1.6,6.56,0,-1.69,6.97,0,-2.04],
// 3 353 -6.65 0 2.28 -6.54 0 .93 -4.71 0 3.44
  [3,353,-6.65,0,2.28,-6.54,0,.93,-4.71,0,3.44],
// 4 10045 0.9 0 6.54 0.34 0 7.55 -0.79 0 7.89 -0.34 0 7.1
  [4,10045,0.9,0,6.54,0.34,0,7.55,-0.79,0,7.89,-0.34,0,7.1],
// 4 10045 -0.34 0 7.1 -0.79 0 7.89 -1.92 0 8 -1.69 0 6.99
  [4,10045,-0.34,0,7.1,-0.79,0,7.89,-1.92,0,8,-1.69,0,6.99],
// 4 10045 -0.46 0 3.78 -1.11 0 3.87 -1.82 0 3.54 -1.13 0 3.55
  [4,10045,-0.46,0,3.78,-1.11,0,3.87,-1.82,0,3.54,-1.13,0,3.55],
// 4 10045 -1.92 0 2.82 -1.13 0 3.55 -1.82 0 3.54 -2.53 0 2.98
  [4,10045,-1.92,0,2.82,-1.13,0,3.55,-1.82,0,3.54,-2.53,0,2.98],
// 4 10045 -1.92 0 8 -2.82 0 7.78 -2.82 0 6.65 -1.69 0 6.99
  [4,10045,-1.92,0,8,-2.82,0,7.78,-2.82,0,6.65,-1.69,0,6.99],
// 4 10045 -2.53 0 2.98 -3.02 0 2.29 -2.28 0 2.17 -1.92 0 2.82
  [4,10045,-2.53,0,2.98,-3.02,0,2.29,-2.28,0,2.17,-1.92,0,2.82],
// 4 10045 -3.9 0 0.97 -2.95 0 0.24 -2.28 0 2.17 -3.02 0 2.29
  [4,10045,-3.9,0,0.97,-2.95,0,0.24,-2.28,0,2.17,-3.02,0,2.29],
// 4 10045 -2.8 0 8.9 -2.8 0 9.5 -5.3 0 9.5 -3.6 0 8.68
  [4,10045,-2.8,0,8.9,-2.8,0,9.5,-5.3,0,9.5,-3.6,0,8.68],
// 3 10045 -3.6 0 8.68 -5.3 0 9.5 -5.3 0 7.7
  [3,10045,-3.6,0,8.68,-5.3,0,9.5,-5.3,0,7.7],
// 4 10045 -6.09 0 -1.92 -3.94 0 -2.03 -3.38 0 -0.79 -4.96 0 -0.9
  [4,10045,-6.09,0,-1.92,-3.94,0,-2.03,-3.38,0,-0.79,-4.96,0,-0.9],
// 3 10045 -3.83 0 7.44 -2.82 0 6.65 -2.82 0 7.78
  [3,10045,-3.83,0,7.44,-2.82,0,6.65,-2.82,0,7.78],
// 4 10045 -7.32 0 -2.48 -5.41 0 -3.49 -3.94 0 -2.03 -6.09 0 -1.92
  [4,10045,-7.32,0,-2.48,-5.41,0,-3.49,-3.94,0,-2.03,-6.09,0,-1.92],
// 4 10045 -6.76 0 5.75 -4.96 0 4.62 -4.39 0 5.07 -6.09 0 5.97
  [4,10045,-6.76,0,5.75,-4.96,0,4.62,-4.39,0,5.07,-6.09,0,5.97],
// 4 10045 -8.11 0 5.52 -6.65 0 3.83 -4.96 0 4.62 -6.76 0 5.75
  [4,10045,-8.11,0,5.52,-6.65,0,3.83,-4.96,0,4.62,-6.76,0,5.75],
// 4 10045 -2.95 0 0.24 -3.9 0 0.97 -4.96 0 -0.9 -3.38 0 -0.79
  [4,10045,-2.95,0,0.24,-3.9,0,0.97,-4.96,0,-0.9,-3.38,0,-0.79],
// 4 10045 -9.5 0 -5.3 -6.65 0 -4.28 -5.41 0 -3.49 -7.32 0 -2.48
  [4,10045,-9.5,0,-5.3,-6.65,0,-4.28,-5.41,0,-3.49,-7.32,0,-2.48],
// 4 10045 -2.82 0 6.65 -3.83 0 7.44 -6.09 0 5.97 -4.39 0 5.07
  [4,10045,-2.82,0,6.65,-3.83,0,7.44,-6.09,0,5.97,-4.39,0,5.07],
// 4 10045 -9.5 0 5.5 -9.5 0 3.35 -8.45 0 3.38 -8.11 0 5.52
  [4,10045,-9.5,0,5.5,-9.5,0,3.35,-8.45,0,3.38,-8.11,0,5.52],
// 3 10045 -6.65 0 3.83 -8.11 0 5.52 -8.45 0 3.38
  [3,10045,-6.65,0,3.83,-8.11,0,5.52,-8.45,0,3.38],
// 3 10045 -9.5 0 -2.8 -9.5 0 -5.3 -7.32 0 -2.48
  [3,10045,-9.5,0,-2.8,-9.5,0,-5.3,-7.32,0,-2.48],
// 4 10045 0.34 0 7.55 0.9 0 6.54 1.8 0 5.52 1.2 0 6.65
  [4,10045,0.34,0,7.55,0.9,0,6.54,1.8,0,5.52,1.2,0,6.65],
// 4 10045 3.27 0 6.37 5.5 0 9.5 2.25 0 7.1 2.59 0 5.97
  [4,10045,3.27,0,6.37,5.5,0,9.5,2.25,0,7.1,2.59,0,5.97],
// 3 10045 3.04 0 8.34 2.25 0 7.1 5.5 0 9.5
  [3,10045,3.04,0,8.34,2.25,0,7.1,5.5,0,9.5],
// 3 10045 3.04 0 8.34 5.5 0 9.5 3.35 0 9.5
  [3,10045,3.04,0,8.34,5.5,0,9.5,3.35,0,9.5],
// 4 10045 3.27 0 6.37 4.39 0 7.16 5.17 0 8.27 5.5 0 9.5
  [4,10045,3.27,0,6.37,4.39,0,7.16,5.17,0,8.27,5.5,0,9.5],
// 4 10045 -1.11 0 3.87 -0.46 0 3.78 1.1 0 3.88 -0.07 0 4.01
  [4,10045,-1.11,0,3.87,-0.46,0,3.78,1.1,0,3.88,-0.07,0,4.01],
// 4 82 3.23 0 2.52 3.89 0 2.6 2.17 0 3.24 2.6 0 2.75
  [4,82,3.23,0,2.52,3.89,0,2.6,2.17,0,3.24,2.6,0,2.75],
// 4 82 6.94 0 7.93 1.92 0 3.89 2.17 0 3.24 3.89 0 2.6
  [4,82,6.94,0,7.93,1.92,0,3.89,2.17,0,3.24,3.89,0,2.6],
// 4 16 1.1 0 3.88 1.8 0 5.52 .9 0 6.54 -.07 0 4.01
  [4,16,1.1,0,3.88,1.8,0,5.52,.9,0,6.54,-.07,0,4.01],
// 3 16 -1.11 0 3.87 -.07 0 4.01 .9 0 6.54
  [3,16,-1.11,0,3.87,-.07,0,4.01,.9,0,6.54],
// 4 16 -.79 0 7.89 .37 0 8.75 -.75 0 9.01 -1.92 0 8
  [4,16,-.79,0,7.89,.37,0,8.75,-.75,0,9.01,-1.92,0,8],
// 4 16 1.05 0 8.23 .37 0 8.75 -.79 0 7.89 .34 0 7.55
  [4,16,1.05,0,8.23,.37,0,8.75,-.79,0,7.89,.34,0,7.55],
// 4 16 10 0 10 -10 0 10 1.5 0 9.5 3.35 0 9.5
  [4,16,10,0,10,-10,0,10,1.5,0,9.5,3.35,0,9.5],
// 3 16 -10 0 10 -.75 0 9.5 1.5 0 9.5
  [3,16,-10,0,10,-.75,0,9.5,1.5,0,9.5],
// 4 16 -2.82 0 6.65 -1.82 0 3.54 -1.11 0 3.87 -1.69 0 6.99
  [4,16,-2.82,0,6.65,-1.82,0,3.54,-1.11,0,3.87,-1.69,0,6.99],
// 4 16 -.75 0 9.01 -.75 0 9.5 -2.8 0 9.5 -2.8 0 8.9
  [4,16,-.75,0,9.01,-.75,0,9.5,-2.8,0,9.5,-2.8,0,8.9],
// 4 16 -5.52 0 -7.44 -3.72 0 -8.56 -3.04 0 -7.1 -4.62 0 -6.31
  [4,16,-5.52,0,-7.44,-3.72,0,-8.56,-3.04,0,-7.1,-4.62,0,-6.31],
// 4 16 -.75 0 9.01 -2.8 0 8.9 -3.6 0 8.68 -1.92 0 8
  [4,16,-.75,0,9.01,-2.8,0,8.9,-3.6,0,8.68,-1.92,0,8],
// 3 16 -3.6 0 8.68 -2.82 0 7.78 -1.92 0 8
  [3,16,-3.6,0,8.68,-2.82,0,7.78,-1.92,0,8],
// 4 16 -5.3 0 7.7 -3.83 0 7.44 -2.82 0 7.78 -3.6 0 8.68
  [4,16,-5.3,0,7.7,-3.83,0,7.44,-2.82,0,7.78,-3.6,0,8.68],
// 4 16 -3.38 0 -.79 -3.94 0 -2.03 -4 0 -4.2 -2.7 0 -5.35
  [4,16,-3.38,0,-.79,-3.94,0,-2.03,-4,0,-4.2,-2.7,0,-5.35],
// 3 16 -4.17 0 -5.52 -2.7 0 -5.35 -4 0 -4.2
  [3,16,-4.17,0,-5.52,-2.7,0,-5.35,-4,0,-4.2],
// 4 16 -1.82 0 3.54 -2.82 0 6.65 -4.39 0 5.07 -2.53 0 2.98
  [4,16,-1.82,0,3.54,-2.82,0,6.65,-4.39,0,5.07,-2.53,0,2.98],
// 4 16 -4.17 0 -5.52 -4.62 0 -6.31 -3.04 0 -7.1 -2.7 0 -5.35
  [4,16,-4.17,0,-5.52,-4.62,0,-6.31,-3.04,0,-7.1,-2.7,0,-5.35],
// 4 16 -2.53 0 2.98 -4.39 0 5.07 -4.96 0 4.62 -3.02 0 2.29
  [4,16,-2.53,0,2.98,-4.39,0,5.07,-4.96,0,4.62,-3.02,0,2.29],
// 4 16 -6.31 0 -8 -4.5 0 -9.5 -3.72 0 -8.56 -5.52 0 -7.44
  [4,16,-6.31,0,-8,-4.5,0,-9.5,-3.72,0,-8.56,-5.52,0,-7.44],
// 4 16 -3.94 0 -2.03 -5.41 0 -3.49 -5.6 0 -6 -4 0 -4.2
  [4,16,-3.94,0,-2.03,-5.41,0,-3.49,-5.6,0,-6,-4,0,-4.2],
// 4 16 -5.41 0 -3.49 -6.65 0 -4.28 -6.8 0 -6.7 -5.6 0 -6
  [4,16,-5.41,0,-3.49,-6.65,0,-4.28,-6.8,0,-6.7,-5.6,0,-6],
// 4 16 -3.83 0 7.44 -5.3 0 7.7 -7.73 0 8.09 -6.09 0 5.97
  [4,16,-3.83,0,7.44,-5.3,0,7.7,-7.73,0,8.09,-6.09,0,5.97],
// 4 16 -6.09 0 -1.92 -4.96 0 -.9 -6.54 0 .93 -7.55 0 .14
  [4,16,-6.09,0,-1.92,-4.96,0,-.9,-6.54,0,.93,-7.55,0,.14],
// 3 16 -7.1 0 -8.56 -4.5 0 -9.5 -6.31 0 -8
  [3,16,-7.1,0,-8.56,-4.5,0,-9.5,-6.31,0,-8],
// 4 16 -8.23 0 -.31 -7.32 0 -2.48 -6.09 0 -1.92 -7.55 0 .14
  [4,16,-8.23,0,-.31,-7.32,0,-2.48,-6.09,0,-1.92,-7.55,0,.14],
// 3 16 -7.73 0 8.09 -5.3 0 7.7 -7.19 0 8.73
  [3,16,-7.73,0,8.09,-5.3,0,7.7,-7.19,0,8.73],
// 4 16 -5.3 0 7.7 -5.3 0 9.5 -7 0 9.5 -7.19 0 8.73
  [4,16,-5.3,0,7.7,-5.3,0,9.5,-7,0,9.5,-7.19,0,8.73],
// 4 16 -9.5 0 -2.8 -7.32 0 -2.48 -8.23 0 -.31 -9.5 0 -.75
  [4,16,-9.5,0,-2.8,-7.32,0,-2.48,-8.23,0,-.31,-9.5,0,-.75],
// 4 16 -6.09 0 5.97 -7.73 0 8.09 -8.54 0 7.65 -6.76 0 5.75
  [4,16,-6.09,0,5.97,-7.73,0,8.09,-8.54,0,7.65,-6.76,0,5.75],
// 3 16 -8.54 0 7.65 -8.11 0 5.52 -6.76 0 5.75
  [3,16,-8.54,0,7.65,-8.11,0,5.52,-6.76,0,5.75],
// 4 16 -9.5 0 1.5 -8.56 0 1.49 -8.45 0 3.38 -9.5 0 3.35
  [4,16,-9.5,0,1.5,-8.56,0,1.49,-8.45,0,3.38,-9.5,0,3.35],
// 4 16 -6.65 0 2.28 -8.45 0 3.38 -8.56 0 1.49 -7.44 0 1.83
  [4,16,-6.65,0,2.28,-8.45,0,3.38,-8.56,0,1.49,-7.44,0,1.83],
// 4 16 -6.65 0 -4.28 -9.5 0 -5.3 -8.5 0 -7 -6.8 0 -6.7
  [4,16,-6.65,0,-4.28,-9.5,0,-5.3,-8.5,0,-7,-6.8,0,-6.7],
// 3 16 -8.5 0 -7 -9.5 0 -5.3 -9.5 0 -7
  [3,16,-8.5,0,-7,-9.5,0,-5.3,-9.5,0,-7],
// 4 16 -9.5 0 7.5 -9.5 0 5.5 -8.11 0 5.52 -8.54 0 7.65
  [4,16,-9.5,0,7.5,-9.5,0,5.5,-8.11,0,5.52,-8.54,0,7.65],
// 3 16 -9.5 0 3.35 -9.5 0 5.5 -10 0 10
  [3,16,-9.5,0,3.35,-9.5,0,5.5,-10,0,10],
// 3 16 -9.5 0 -5.3 -10 0 -10 -9.5 0 -7
  [3,16,-9.5,0,-5.3,-10,0,-10,-9.5,0,-7],
// 3 16 -2.8 0 9.5 -.75 0 9.5 -10 0 10
  [3,16,-2.8,0,9.5,-.75,0,9.5,-10,0,10],
// 3 16 -10 0 10 -5.3 0 9.5 -2.8 0 9.5
  [3,16,-10,0,10,-5.3,0,9.5,-2.8,0,9.5],
// 3 16 -10 0 10 -7 0 9.5 -5.3 0 9.5
  [3,16,-10,0,10,-7,0,9.5,-5.3,0,9.5],
// 3 16 -10 0 10 -9.5 0 9.5 -7 0 9.5
  [3,16,-10,0,10,-9.5,0,9.5,-7,0,9.5],
// 3 16 -9.5 0 -2.8 -10 0 -10 -9.5 0 -5.3
  [3,16,-9.5,0,-2.8,-10,0,-10,-9.5,0,-5.3],
// 3 16 -9.5 0 7.5 -10 0 10 -9.5 0 5.5
  [3,16,-9.5,0,7.5,-10,0,10,-9.5,0,5.5],
// 4 16 -10 0 -10 -4.5 0 -9.5 -7.1 0 -8.56 -9.5 0 -9.5
  [4,16,-10,0,-10,-4.5,0,-9.5,-7.1,0,-8.56,-9.5,0,-9.5],
// 3 16 -10 0 10 -9.5 0 1.5 -9.5 0 3.35
  [3,16,-10,0,10,-9.5,0,1.5,-9.5,0,3.35],
// 4 16 1.05 0 8.23 .34 0 7.55 1.2 0 6.65 2.25 0 7.1
  [4,16,1.05,0,8.23,.34,0,7.55,1.2,0,6.65,2.25,0,7.1],
// 4 16 -1.69 0 6.99 -1.11 0 3.87 .9 0 6.54 -.34 0 7.1
  [4,16,-1.69,0,6.99,-1.11,0,3.87,.9,0,6.54,-.34,0,7.1],
// 4 16 1.05 0 8.23 2.25 0 7.1 3.04 0 8.34 1.5 0 9.5
  [4,16,1.05,0,8.23,2.25,0,7.1,3.04,0,8.34,1.5,0,9.5],
// 4 16 2.25 0 7.1 1.2 0 6.65 1.8 0 5.52 2.59 0 5.97
  [4,16,2.25,0,7.1,1.2,0,6.65,1.8,0,5.52,2.59,0,5.97],
// 3 16 10 0 10 7.5 0 9.5 9.5 0 9.5
  [3,16,10,0,10,7.5,0,9.5,9.5,0,9.5],
// 4 16 9.5 0 -9.5 10 0 -10 10 0 10 9.5 0 4.17
  [4,16,9.5,0,-9.5,10,0,-10,10,0,10,9.5,0,4.17],
// 4 16 10 0 -10 2.03 0 -9.5 -4.5 0 -9.5 -10 0 -10
  [4,16,10,0,-10,2.03,0,-9.5,-4.5,0,-9.5,-10,0,-10],
// 3 16 3.04 0 8.34 3.35 0 9.5 1.5 0 9.5
  [3,16,3.04,0,8.34,3.35,0,9.5,1.5,0,9.5],
// 4 16 6 0 2.03 4.75 0 1.61 5.13 0 .89 6.11 0 1.69
  [4,16,6,0,2.03,4.75,0,1.61,5.13,0,.89,6.11,0,1.69],
// 4 16 6.11 0 1.69 5.13 0 .89 5.18 0 -1.37 6.34 0 -1.24
  [4,16,6.11,0,1.69,5.13,0,.89,5.18,0,-1.37,6.34,0,-1.24],
// 3 16 3.27 0 6.37 6.94 0 7.93 4.39 0 7.16
  [3,16,3.27,0,6.37,6.94,0,7.93,4.39,0,7.16],
// 3 16 5.17 0 8.27 4.39 0 7.16 6.94 0 7.93
  [3,16,5.17,0,8.27,4.39,0,7.16,6.94,0,7.93],
// 4 16 5.5 0 9.5 5.17 0 8.27 6.94 0 7.93 7.5 0 9.5
  [4,16,5.5,0,9.5,5.17,0,8.27,6.94,0,7.93,7.5,0,9.5],
// 4 16 6 0 3.38 6.45 0 3.38 6.9 0 4.65 5.8 0 4.25
  [4,16,6,0,3.38,6.45,0,3.38,6.9,0,4.65,5.8,0,4.25],
// 4 16 5.8 0 4.25 6.13 0 4.51 7.15 0 5.97 6.94 0 7.93
  [4,16,5.8,0,4.25,6.13,0,4.51,7.15,0,5.97,6.94,0,7.93],
// 4 16 4.16 0 2.12 4.75 0 1.61 6 0 2.03 5.43 0 2.82
  [4,16,4.16,0,2.12,4.75,0,1.61,6,0,2.03,5.43,0,2.82],
// 3 16 6 0 3.38 5.8 0 4.25 5.55 0 3.16
  [3,16,6,0,3.38,5.8,0,4.25,5.55,0,3.16],
// 4 16 5.18 0 -1.37 5.77 0 -2.29 6.56 0 -1.69 6.34 0 -1.24
  [4,16,5.18,0,-1.37,5.77,0,-2.29,6.56,0,-1.69,6.34,0,-1.24],
// 4 16 6.64 0 -2.86 7.02 0 -3.13 7.82 0 -3.14 8.32 0 -1.68
  [4,16,6.64,0,-2.86,7.02,0,-3.13,7.82,0,-3.14,8.32,0,-1.68],
// 4 16 7.98 0 -1.4 7.85 0 -.87 6.75 0 -.79 6.79 0 -1.6
  [4,16,7.98,0,-1.4,7.85,0,-.87,6.75,0,-.79,6.79,0,-1.6],
// 3 16 8.16 0 3.29 7.72 0 3.85 6.9 0 2.82
  [3,16,8.16,0,3.29,7.72,0,3.85,6.9,0,2.82],
// 4 16 6.9 0 2.82 7.12 0 2.03 8.45 0 2.75 8.16 0 3.29
  [4,16,6.9,0,2.82,7.12,0,2.03,8.45,0,2.75,8.16,0,3.29],
// 4 16 8.51 0 1.35 8.58 0 2.06 8.45 0 2.75 7.12 0 2.03
  [4,16,8.51,0,1.35,8.58,0,2.06,8.45,0,2.75,7.12,0,2.03],
// 4 16 8.29 0 .9 8.51 0 1.35 7.12 0 2.03 7.05 0 .34
  [4,16,8.29,0,.9,8.51,0,1.35,7.12,0,2.03,7.05,0,.34],
// 4 16 7.15 0 5.97 7.49 0 7.44 7.5 0 9.5 6.94 0 7.93
  [4,16,7.15,0,5.97,7.49,0,7.44,7.5,0,9.5,6.94,0,7.93],
// 4 16 6.9 0 2.82 7.72 0 3.85 6.9 0 4.65 6.45 0 3.38
  [4,16,6.9,0,2.82,7.72,0,3.85,6.9,0,4.65,6.45,0,3.38],
// 3 16 5.5 0 9.5 7.5 0 9.5 10 0 10
  [3,16,5.5,0,9.5,7.5,0,9.5,10,0,10],
// 3 16 10 0 10 3.35 0 9.5 5.5 0 9.5
  [3,16,10,0,10,3.35,0,9.5,5.5,0,9.5],
// 4 16 6.75 0 -.79 7.85 0 -.87 8.29 0 .9 7.05 0 .34
  [4,16,6.75,0,-.79,7.85,0,-.87,8.29,0,.9,7.05,0,.34],
// 4 16 6.97 0 -2.04 8.32 0 -1.68 7.98 0 -1.4 6.79 0 -1.6
  [4,16,6.97,0,-2.04,8.32,0,-1.68,7.98,0,-1.4,6.79,0,-1.6],
// 4 16 8.28 0 5.63 7.72 0 3.85 9.5 0 4.17 9.06 0 6.99
  [4,16,8.28,0,5.63,7.72,0,3.85,9.5,0,4.17,9.06,0,6.99],
// 4 16 8.56 0 -2.93 8.97 0 -2.34 8.32 0 -1.68 7.82 0 -3.14
  [4,16,8.56,0,-2.93,8.97,0,-2.34,8.32,0,-1.68,7.82,0,-3.14],
// 3 16 8.97 0 -2.34 9.22 0 -1.4 8.32 0 -1.68
  [3,16,8.97,0,-2.34,9.22,0,-1.4,8.32,0,-1.68],
// 3 16 9.5 0 -9.5 2.03 0 -9.5 10 0 -10
  [3,16,9.5,0,-9.5,2.03,0,-9.5,10,0,-10],
// 3 16 -9.5 0 7.5 -9.5 0 9.5 -10 0 10
  [3,16,-9.5,0,7.5,-9.5,0,9.5,-10,0,10],
// 4 16 -9.5 0 -2.8 -9.5 0 -.75 -10 0 10 -10 0 -10
  [4,16,-9.5,0,-2.8,-9.5,0,-.75,-10,0,10,-10,0,-10],
// 3 16 -9.5 0 -.75 -9.5 0 1.5 -10 0 10
  [3,16,-9.5,0,-.75,-9.5,0,1.5,-10,0,10],
// 3 16 -9.5 0 -9.5 -9.5 0 -7 -10 0 -10
  [3,16,-9.5,0,-9.5,-9.5,0,-7,-10,0,-10],
// 4 16 -3.38 0 -.79 -2.7 0 -5.35 -2.8 0 -1 -2.95 0 .24
  [4,16,-3.38,0,-.79,-2.7,0,-5.35,-2.8,0,-1,-2.95,0,.24],
// 3 16 6.64 0 -2.86 8.32 0 -1.68 6.97 0 -2.04
  [3,16,6.64,0,-2.86,8.32,0,-1.68,6.97,0,-2.04],
// 4 16 5.77 0 -2.29 6.64 0 -2.86 6.97 0 -2.04 6.56 0 -1.69
  [4,16,5.77,0,-2.29,6.64,0,-2.86,6.97,0,-2.04,6.56,0,-1.69],
// 4 16 -8.45 0 3.38 -6.65 0 2.28 -4.71 0 3.44 -6.65 0 3.83
  [4,16,-8.45,0,3.38,-6.65,0,2.28,-4.71,0,3.44,-6.65,0,3.83],
// 3 16 -6.65 0 3.83 -4.71 0 3.44 -4.96 0 4.62
  [3,16,-6.65,0,3.83,-4.71,0,3.44,-4.96,0,4.62],
// 4 16 -4.96 0 4.62 -4.71 0 3.44 -3.9 0 .97 -3.02 0 2.29
  [4,16,-4.96,0,4.62,-4.71,0,3.44,-3.9,0,.97,-3.02,0,2.29],
// 4 16 -4.96 0 -.9 -3.9 0 .97 -4.71 0 3.44 -6.54 0 .93
  [4,16,-4.96,0,-.9,-3.9,0,.97,-4.71,0,3.44,-6.54,0,.93],
// 3 16 6.9 0 4.65 7.72 0 3.85 7.6 0 5.07
  [3,16,6.9,0,4.65,7.72,0,3.85,7.6,0,5.07],
// 3 16 7.6 0 5.07 7.72 0 3.85 8.28 0 5.63
  [3,16,7.6,0,5.07,7.72,0,3.85,8.28,0,5.63],
// 3 16 9.06 0 6.99 9.5 0 4.17 9.4 0 8
  [3,16,9.06,0,6.99,9.5,0,4.17,9.4,0,8],
// 4 16 9.5 0 4.17 10 0 10 9.5 0 9.5 9.4 0 8
  [4,16,9.5,0,4.17,10,0,10,9.5,0,9.5,9.4,0,8],
// 4 16 6.94 0 7.93 3.89 0 2.6 4.16 0 2.12 5.8 0 4.25
  [4,16,6.94,0,7.93,3.89,0,2.6,4.16,0,2.12,5.8,0,4.25],
// 4 16 5.43 0 2.82 5.55 0 3.16 5.8 0 4.25 4.16 0 2.12
  [4,16,5.43,0,2.82,5.55,0,3.16,5.8,0,4.25,4.16,0,2.12],
// 4 16 6.94 0 7.93 3.27 0 6.37 2.59 0 5.97 1.92 0 3.89
  [4,16,6.94,0,7.93,3.27,0,6.37,2.59,0,5.97,1.92,0,3.89],
// 4 16 1.92 0 3.89 2.59 0 5.97 1.8 0 5.52 1.1 0 3.88
  [4,16,1.92,0,3.89,2.59,0,5.97,1.8,0,5.52,1.1,0,3.88],
// 4 16 2.17 0 3.24 1.92 0 3.89 1.1 0 3.88 1.44 0 2.83
  [4,16,2.17,0,3.24,1.92,0,3.89,1.1,0,3.88,1.44,0,2.83],
// 4 16 1.44 0 2.83 2.1 0 2.32 2.6 0 2.75 2.17 0 3.24
  [4,16,1.44,0,2.83,2.1,0,2.32,2.6,0,2.75,2.17,0,3.24],
// 4 16 2.6 0 2.75 2.1 0 2.32 4.16 0 2.12 3.23 0 2.52
  [4,16,2.6,0,2.75,2.1,0,2.32,4.16,0,2.12,3.23,0,2.52],
// 3 16 4.16 0 2.12 3.89 0 2.6 3.23 0 2.52
  [3,16,4.16,0,2.12,3.89,0,2.6,3.23,0,2.52],
];
module ldraw_lib__3070bp0o(step=0, col=false, unit=2/5, alt=false, line=0.2, solid=!$preview)
    makepoly(ldraw_lib__3070bp0o(), step=step, col=col, unit=unit, alt=alt, line=line, solid=solid);
ldraw_lib__3070bp0o(line=0.2);
